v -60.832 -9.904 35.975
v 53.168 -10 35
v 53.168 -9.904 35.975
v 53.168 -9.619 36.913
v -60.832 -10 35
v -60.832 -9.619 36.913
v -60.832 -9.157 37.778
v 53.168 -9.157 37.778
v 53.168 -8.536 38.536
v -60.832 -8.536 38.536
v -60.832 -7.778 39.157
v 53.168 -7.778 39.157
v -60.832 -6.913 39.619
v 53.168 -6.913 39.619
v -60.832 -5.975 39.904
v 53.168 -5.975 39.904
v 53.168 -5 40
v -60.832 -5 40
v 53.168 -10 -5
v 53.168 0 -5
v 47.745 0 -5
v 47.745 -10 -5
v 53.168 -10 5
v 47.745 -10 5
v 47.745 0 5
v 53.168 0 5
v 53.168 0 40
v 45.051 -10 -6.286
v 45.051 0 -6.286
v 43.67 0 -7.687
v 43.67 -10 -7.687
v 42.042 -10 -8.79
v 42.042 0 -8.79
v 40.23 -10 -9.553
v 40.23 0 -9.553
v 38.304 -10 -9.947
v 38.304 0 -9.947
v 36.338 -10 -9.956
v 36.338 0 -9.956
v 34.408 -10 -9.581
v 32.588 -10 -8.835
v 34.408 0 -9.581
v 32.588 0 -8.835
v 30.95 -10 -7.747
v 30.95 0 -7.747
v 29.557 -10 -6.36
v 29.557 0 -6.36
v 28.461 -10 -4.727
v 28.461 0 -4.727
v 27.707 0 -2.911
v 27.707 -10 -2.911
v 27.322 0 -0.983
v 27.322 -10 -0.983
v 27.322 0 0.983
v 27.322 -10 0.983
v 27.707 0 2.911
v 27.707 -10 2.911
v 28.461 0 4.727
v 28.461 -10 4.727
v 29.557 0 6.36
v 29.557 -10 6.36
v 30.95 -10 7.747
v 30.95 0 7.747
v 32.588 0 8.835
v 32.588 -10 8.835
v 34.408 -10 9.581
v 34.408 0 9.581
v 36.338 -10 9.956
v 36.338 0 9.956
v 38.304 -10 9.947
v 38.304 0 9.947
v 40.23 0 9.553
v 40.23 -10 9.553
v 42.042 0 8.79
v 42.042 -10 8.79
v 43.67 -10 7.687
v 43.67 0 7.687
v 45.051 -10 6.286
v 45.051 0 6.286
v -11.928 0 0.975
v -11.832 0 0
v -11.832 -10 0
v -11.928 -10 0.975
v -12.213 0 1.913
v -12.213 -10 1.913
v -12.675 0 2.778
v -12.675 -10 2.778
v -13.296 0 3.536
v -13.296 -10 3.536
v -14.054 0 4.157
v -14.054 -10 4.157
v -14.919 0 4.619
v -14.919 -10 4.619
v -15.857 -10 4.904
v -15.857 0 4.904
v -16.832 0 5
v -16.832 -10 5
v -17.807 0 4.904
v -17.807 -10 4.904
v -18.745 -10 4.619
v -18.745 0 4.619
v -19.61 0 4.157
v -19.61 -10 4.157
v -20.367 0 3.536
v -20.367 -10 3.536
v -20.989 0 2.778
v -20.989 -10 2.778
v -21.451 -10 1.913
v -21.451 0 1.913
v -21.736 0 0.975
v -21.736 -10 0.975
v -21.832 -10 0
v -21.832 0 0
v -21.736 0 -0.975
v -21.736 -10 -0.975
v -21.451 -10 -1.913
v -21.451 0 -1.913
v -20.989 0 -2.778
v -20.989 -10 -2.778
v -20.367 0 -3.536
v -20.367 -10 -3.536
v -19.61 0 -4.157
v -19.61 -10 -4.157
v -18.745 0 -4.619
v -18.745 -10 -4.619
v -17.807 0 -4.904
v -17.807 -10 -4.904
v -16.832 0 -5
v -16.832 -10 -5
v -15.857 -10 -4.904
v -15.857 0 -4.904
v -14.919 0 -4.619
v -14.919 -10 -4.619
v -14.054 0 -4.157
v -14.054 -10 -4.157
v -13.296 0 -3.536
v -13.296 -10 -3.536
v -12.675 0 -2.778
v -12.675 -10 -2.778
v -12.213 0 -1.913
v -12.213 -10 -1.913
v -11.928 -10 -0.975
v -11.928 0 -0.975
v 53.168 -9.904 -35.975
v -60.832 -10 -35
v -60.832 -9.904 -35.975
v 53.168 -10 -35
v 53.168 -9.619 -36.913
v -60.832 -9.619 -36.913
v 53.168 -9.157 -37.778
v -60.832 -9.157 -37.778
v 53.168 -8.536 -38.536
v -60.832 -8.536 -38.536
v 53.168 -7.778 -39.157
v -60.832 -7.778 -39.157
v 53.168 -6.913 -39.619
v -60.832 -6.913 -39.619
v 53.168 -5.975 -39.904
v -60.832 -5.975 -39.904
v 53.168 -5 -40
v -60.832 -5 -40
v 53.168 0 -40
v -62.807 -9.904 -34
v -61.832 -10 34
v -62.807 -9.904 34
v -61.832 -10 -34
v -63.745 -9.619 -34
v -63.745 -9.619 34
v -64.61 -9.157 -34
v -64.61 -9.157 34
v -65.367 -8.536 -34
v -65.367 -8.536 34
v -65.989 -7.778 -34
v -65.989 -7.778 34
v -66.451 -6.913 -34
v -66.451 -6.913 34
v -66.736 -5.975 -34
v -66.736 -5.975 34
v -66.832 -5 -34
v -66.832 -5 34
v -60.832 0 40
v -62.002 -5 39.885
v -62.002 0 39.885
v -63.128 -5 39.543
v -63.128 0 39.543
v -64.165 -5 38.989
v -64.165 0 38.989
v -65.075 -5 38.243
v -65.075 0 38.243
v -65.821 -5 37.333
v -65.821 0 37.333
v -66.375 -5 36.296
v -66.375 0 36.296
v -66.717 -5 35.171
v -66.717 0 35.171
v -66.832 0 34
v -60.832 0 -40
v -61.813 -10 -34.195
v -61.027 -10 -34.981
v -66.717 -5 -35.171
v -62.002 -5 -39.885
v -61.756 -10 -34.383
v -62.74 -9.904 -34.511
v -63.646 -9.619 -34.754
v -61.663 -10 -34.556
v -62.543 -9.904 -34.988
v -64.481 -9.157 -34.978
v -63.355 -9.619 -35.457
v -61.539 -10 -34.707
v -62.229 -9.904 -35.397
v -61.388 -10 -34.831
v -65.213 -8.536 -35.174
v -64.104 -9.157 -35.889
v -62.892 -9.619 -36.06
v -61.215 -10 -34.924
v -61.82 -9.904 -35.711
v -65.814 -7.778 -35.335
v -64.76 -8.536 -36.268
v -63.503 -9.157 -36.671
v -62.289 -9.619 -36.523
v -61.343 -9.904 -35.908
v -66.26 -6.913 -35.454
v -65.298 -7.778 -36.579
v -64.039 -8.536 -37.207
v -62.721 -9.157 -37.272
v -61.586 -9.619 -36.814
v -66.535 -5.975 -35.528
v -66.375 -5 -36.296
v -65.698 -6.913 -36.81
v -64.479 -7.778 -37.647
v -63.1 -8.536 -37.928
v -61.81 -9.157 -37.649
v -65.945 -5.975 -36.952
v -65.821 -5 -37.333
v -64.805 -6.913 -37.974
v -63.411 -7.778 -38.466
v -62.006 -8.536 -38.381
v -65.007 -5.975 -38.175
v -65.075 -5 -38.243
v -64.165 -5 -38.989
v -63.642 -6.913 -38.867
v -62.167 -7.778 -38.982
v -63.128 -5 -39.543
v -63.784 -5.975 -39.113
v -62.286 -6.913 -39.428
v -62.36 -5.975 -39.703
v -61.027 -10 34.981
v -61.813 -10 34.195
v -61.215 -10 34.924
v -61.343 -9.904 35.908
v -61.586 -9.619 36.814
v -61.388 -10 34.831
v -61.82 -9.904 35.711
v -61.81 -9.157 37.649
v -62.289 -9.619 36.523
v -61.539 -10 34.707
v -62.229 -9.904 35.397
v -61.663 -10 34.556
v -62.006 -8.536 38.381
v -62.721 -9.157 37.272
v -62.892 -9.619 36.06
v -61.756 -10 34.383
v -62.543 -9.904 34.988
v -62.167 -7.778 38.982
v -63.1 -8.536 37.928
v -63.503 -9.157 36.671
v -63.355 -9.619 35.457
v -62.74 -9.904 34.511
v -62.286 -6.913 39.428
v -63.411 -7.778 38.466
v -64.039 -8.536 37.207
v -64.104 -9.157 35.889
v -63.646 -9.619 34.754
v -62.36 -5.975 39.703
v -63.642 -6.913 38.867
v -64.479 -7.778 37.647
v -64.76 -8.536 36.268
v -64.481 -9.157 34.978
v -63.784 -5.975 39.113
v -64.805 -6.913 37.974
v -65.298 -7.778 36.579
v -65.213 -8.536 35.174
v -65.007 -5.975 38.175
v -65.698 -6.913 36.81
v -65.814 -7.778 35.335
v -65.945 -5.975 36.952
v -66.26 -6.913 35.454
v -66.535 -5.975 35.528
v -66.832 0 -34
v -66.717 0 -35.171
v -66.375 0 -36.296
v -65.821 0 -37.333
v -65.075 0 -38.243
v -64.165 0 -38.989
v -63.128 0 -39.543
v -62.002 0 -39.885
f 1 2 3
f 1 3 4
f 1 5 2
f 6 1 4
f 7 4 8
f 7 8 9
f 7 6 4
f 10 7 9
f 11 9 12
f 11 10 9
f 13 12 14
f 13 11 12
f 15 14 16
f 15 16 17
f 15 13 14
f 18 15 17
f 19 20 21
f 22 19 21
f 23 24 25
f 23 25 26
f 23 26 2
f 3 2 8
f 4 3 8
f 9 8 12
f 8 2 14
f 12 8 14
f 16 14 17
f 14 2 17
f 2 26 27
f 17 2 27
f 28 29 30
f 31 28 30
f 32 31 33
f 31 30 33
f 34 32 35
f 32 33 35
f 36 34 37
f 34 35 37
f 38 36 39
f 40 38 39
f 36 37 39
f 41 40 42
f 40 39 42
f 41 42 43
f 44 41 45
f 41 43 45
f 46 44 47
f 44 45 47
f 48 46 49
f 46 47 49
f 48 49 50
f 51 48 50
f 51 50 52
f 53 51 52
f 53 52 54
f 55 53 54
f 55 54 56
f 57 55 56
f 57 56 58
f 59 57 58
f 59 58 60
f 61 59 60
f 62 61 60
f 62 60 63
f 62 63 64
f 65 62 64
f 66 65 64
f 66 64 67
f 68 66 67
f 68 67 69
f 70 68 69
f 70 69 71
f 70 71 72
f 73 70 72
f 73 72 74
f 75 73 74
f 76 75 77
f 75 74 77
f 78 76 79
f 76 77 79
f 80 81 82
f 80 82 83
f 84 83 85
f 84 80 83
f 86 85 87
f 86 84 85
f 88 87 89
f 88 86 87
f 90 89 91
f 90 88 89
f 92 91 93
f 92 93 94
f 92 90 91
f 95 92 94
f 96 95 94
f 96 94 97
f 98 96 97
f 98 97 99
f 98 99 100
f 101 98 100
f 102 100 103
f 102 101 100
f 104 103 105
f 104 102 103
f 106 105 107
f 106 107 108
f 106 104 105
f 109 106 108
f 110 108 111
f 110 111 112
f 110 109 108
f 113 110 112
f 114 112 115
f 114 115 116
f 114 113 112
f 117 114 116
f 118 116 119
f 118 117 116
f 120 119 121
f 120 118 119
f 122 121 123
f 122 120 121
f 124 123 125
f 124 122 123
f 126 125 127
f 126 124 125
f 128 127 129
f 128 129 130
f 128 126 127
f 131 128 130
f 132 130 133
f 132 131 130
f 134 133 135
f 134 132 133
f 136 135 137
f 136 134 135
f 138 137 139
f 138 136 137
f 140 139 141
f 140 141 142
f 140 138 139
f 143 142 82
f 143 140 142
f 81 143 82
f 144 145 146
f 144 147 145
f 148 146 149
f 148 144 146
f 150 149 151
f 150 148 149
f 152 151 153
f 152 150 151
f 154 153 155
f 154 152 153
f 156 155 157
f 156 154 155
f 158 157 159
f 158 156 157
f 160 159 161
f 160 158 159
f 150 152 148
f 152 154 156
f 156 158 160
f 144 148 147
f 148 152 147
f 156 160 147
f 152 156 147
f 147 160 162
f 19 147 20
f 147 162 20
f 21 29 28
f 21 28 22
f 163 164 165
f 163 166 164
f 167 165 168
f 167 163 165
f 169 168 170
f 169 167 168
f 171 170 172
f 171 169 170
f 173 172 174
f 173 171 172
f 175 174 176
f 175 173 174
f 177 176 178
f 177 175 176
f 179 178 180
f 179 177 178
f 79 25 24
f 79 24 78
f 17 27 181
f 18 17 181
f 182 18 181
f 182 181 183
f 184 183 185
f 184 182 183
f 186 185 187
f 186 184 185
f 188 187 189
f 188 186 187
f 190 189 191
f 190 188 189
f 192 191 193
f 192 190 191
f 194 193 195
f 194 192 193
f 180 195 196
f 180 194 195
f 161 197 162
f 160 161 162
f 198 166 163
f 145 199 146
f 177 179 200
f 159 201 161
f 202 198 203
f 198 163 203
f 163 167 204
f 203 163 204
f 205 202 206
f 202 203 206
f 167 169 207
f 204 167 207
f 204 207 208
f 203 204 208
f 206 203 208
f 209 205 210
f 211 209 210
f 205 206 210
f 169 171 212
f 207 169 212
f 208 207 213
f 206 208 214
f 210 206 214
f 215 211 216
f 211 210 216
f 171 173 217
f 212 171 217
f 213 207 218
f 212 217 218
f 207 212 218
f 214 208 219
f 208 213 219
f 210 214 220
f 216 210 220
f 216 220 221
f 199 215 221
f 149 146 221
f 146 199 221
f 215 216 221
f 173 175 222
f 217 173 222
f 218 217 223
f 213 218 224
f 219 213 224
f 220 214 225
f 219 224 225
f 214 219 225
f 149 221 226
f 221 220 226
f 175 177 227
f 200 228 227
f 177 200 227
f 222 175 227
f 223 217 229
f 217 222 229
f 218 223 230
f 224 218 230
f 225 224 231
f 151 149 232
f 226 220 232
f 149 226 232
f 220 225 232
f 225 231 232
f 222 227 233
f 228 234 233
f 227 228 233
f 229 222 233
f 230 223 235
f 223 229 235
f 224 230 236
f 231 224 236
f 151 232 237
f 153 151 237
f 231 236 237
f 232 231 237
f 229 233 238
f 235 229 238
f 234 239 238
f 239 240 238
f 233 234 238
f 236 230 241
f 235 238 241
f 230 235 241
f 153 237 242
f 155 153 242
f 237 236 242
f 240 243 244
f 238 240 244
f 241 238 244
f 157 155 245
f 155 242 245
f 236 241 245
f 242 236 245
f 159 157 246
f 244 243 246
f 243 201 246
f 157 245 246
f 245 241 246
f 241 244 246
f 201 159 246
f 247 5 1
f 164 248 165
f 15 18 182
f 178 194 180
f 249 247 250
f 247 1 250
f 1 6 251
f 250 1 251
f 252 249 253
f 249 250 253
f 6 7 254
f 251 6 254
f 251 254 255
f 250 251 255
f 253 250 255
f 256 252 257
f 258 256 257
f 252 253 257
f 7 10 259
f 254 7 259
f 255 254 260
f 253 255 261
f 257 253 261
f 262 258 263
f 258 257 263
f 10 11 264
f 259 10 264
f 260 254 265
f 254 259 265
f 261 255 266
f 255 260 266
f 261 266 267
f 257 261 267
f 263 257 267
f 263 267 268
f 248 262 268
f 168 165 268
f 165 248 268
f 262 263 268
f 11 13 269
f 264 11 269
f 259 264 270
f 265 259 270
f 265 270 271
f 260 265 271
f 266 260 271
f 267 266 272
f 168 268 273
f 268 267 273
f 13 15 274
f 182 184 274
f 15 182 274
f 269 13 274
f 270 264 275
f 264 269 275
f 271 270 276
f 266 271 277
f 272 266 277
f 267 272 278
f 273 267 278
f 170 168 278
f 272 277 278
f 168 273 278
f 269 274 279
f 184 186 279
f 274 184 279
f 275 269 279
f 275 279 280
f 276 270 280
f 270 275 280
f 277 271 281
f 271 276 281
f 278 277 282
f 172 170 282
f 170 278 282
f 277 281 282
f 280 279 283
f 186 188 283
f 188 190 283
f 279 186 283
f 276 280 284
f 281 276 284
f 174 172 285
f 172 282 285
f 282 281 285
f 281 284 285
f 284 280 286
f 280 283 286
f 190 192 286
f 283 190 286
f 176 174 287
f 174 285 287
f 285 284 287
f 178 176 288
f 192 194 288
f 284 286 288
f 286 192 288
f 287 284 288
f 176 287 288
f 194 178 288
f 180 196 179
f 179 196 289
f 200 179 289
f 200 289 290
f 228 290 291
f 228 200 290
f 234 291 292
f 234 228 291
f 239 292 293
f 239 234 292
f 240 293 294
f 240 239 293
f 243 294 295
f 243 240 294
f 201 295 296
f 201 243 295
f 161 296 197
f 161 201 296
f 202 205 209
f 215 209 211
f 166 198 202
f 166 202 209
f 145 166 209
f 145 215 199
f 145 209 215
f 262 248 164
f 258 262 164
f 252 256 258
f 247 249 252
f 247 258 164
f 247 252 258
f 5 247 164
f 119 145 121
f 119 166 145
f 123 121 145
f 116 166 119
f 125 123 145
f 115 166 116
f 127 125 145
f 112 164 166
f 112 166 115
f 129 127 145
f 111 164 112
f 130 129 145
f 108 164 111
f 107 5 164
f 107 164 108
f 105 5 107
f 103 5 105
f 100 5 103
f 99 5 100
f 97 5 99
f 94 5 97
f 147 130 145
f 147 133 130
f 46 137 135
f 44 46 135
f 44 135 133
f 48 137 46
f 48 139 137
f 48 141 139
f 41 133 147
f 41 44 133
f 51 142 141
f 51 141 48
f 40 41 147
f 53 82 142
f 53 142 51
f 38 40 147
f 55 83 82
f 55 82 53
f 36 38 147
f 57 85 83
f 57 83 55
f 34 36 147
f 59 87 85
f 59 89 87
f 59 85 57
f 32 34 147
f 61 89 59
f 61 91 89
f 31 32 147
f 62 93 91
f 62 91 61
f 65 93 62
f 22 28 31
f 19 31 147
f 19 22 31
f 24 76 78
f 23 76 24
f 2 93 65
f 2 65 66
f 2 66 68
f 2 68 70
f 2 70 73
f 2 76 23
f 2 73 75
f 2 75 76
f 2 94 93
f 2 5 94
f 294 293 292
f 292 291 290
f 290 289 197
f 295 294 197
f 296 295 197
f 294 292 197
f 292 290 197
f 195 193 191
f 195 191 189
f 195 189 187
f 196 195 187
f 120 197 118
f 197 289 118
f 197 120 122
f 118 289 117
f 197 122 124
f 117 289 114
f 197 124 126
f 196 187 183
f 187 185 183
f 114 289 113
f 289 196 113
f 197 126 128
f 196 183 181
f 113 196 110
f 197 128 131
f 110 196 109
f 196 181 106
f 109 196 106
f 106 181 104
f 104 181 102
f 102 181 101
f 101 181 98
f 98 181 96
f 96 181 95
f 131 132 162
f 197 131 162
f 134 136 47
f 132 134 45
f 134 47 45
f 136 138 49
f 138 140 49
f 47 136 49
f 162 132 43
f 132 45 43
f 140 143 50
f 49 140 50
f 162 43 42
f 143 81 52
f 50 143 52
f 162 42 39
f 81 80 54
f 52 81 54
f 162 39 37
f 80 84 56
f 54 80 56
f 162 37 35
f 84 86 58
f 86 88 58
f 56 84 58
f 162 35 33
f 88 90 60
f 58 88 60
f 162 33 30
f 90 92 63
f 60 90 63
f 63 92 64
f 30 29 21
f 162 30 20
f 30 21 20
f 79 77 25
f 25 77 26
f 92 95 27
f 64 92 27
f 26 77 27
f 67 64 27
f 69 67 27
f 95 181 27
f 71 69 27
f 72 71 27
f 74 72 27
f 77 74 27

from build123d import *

# Parameters (mm, degrees)
F0_R        = 5
F1_DEPTH    = 10
F2_DEPTH    = 23.2
F3_R        = 6
F4_T1_DEPTH = 19.4160695157
F5_R        = 5


# Not quite as in the source:
# - a fillet or chamfer that OpenCascade refuses, or shapes differently, is made with other operations: its cross-section is extruded or revolved along the edge and cut away or added


with BuildPart() as f1:
    # F0 (on Front) → F1 (new body)
    with BuildSketch(Plane.XZ):
        with BuildLine():
            Line((53.1680434942, 40), (-66.8319565058, 40))
            Line((-66.8319565058, 40), (-66.8319565058, -40))
            Line((-66.8319565058, -40), (53.1680434942, -40))
            Line((53.1680434942, -40), (53.1680434942, -5))
            Line((53.1680434942, -5), (47.2735762596, -5))
            Line((47.2735762596, -5), (45.9338302975, -5))
            ThreePointArc((45.9338302975, -5), (27.2735762596, 0), (45.9338302975, 5))
            Line((45.9338302975, 5), (47.2735762596, 5))
            Line((47.2735762596, 5), (53.1680434942, 5))
            Line((53.1680434942, 5), (53.1680434942, 40))
        make_face()
        with Locations((-16.8319565058, 0)):
            Circle(F0_R, mode=Mode.SUBTRACT)
    extrude(amount=F1_DEPTH)

    # F0 (on Front) → F2 (cut)
    with BuildSketch(Plane.XZ):
        with Locations((-16.8319565058, 0)):
            Circle(F0_R)
    extrude(amount=-F2_DEPTH, mode=Mode.SUBTRACT)

    # F3
    f3_edges = [f1.edges().sort_by_distance(p)[0] for p in [
        (-66.831957, -5, -40),
        (-66.831957, -5, 40),
    ]]
    fillet(f3_edges, radius=F3_R)

    # F4: chamfer of 2 on 2 edges, made by hand

    # F4_s2 → F4_t1 (cut)
    with BuildSketch(Plane.XZ.offset(-4.7080347579)):
        with BuildLine():
            Line((44.9783315762, -6.3208937548), (47.8167286643, -4.9655276174))
            Line((47.8167286643, -4.9655276174), (47.8167286643, -4.9255276174))
            ThreePointArc((47.8167286643, -4.9255276174), (46.8752794809, -4.96), (45.9338302975, -4.96))
            Line((45.9338302975, -4.96), (45.8991892813, -4.98))
            ThreePointArc((45.8991892813, -4.98), (45.4646544727, -5.6663778296), (44.9472237878, -6.2957480693))
            Line((44.9472237878, -6.2957480693), (44.9783315762, -6.3208937548))
        make_face()
        with BuildLine():
            Line((47.8167286643, 4.9655276174), (44.9783315762, 6.3208937548))
            Line((44.9783315762, 6.3208937548), (44.9472237878, 6.2957480693))
            ThreePointArc((44.9472237878, 6.2957480693), (45.4646544727, 5.6663778296), (45.8991892813, 4.98))
            Line((45.8991892813, 4.98), (45.9338302975, 4.96))
            ThreePointArc((45.9338302975, 4.96), (46.8752794809, 4.96), (47.8167286643, 4.9255276174))
            Line((47.8167286643, 4.9255276174), (47.8167286643, 4.9655276174))
        make_face()
    extrude(amount=F4_T1_DEPTH, mode=Mode.SUBTRACT)

    # F5
    f5_edges = [f1.edges().sort_by_distance(p)[0] for p in [
        (-3.831957, -10, -40),
        (-3.831957, -10, 40),
        (-65.074597, -10, 38.242641),
        (-65.074597, -10, -38.242641),
        (-66.831957, -10, 0),
    ]]
    fillet(f5_edges, radius=F5_R)


solid = f1.part
